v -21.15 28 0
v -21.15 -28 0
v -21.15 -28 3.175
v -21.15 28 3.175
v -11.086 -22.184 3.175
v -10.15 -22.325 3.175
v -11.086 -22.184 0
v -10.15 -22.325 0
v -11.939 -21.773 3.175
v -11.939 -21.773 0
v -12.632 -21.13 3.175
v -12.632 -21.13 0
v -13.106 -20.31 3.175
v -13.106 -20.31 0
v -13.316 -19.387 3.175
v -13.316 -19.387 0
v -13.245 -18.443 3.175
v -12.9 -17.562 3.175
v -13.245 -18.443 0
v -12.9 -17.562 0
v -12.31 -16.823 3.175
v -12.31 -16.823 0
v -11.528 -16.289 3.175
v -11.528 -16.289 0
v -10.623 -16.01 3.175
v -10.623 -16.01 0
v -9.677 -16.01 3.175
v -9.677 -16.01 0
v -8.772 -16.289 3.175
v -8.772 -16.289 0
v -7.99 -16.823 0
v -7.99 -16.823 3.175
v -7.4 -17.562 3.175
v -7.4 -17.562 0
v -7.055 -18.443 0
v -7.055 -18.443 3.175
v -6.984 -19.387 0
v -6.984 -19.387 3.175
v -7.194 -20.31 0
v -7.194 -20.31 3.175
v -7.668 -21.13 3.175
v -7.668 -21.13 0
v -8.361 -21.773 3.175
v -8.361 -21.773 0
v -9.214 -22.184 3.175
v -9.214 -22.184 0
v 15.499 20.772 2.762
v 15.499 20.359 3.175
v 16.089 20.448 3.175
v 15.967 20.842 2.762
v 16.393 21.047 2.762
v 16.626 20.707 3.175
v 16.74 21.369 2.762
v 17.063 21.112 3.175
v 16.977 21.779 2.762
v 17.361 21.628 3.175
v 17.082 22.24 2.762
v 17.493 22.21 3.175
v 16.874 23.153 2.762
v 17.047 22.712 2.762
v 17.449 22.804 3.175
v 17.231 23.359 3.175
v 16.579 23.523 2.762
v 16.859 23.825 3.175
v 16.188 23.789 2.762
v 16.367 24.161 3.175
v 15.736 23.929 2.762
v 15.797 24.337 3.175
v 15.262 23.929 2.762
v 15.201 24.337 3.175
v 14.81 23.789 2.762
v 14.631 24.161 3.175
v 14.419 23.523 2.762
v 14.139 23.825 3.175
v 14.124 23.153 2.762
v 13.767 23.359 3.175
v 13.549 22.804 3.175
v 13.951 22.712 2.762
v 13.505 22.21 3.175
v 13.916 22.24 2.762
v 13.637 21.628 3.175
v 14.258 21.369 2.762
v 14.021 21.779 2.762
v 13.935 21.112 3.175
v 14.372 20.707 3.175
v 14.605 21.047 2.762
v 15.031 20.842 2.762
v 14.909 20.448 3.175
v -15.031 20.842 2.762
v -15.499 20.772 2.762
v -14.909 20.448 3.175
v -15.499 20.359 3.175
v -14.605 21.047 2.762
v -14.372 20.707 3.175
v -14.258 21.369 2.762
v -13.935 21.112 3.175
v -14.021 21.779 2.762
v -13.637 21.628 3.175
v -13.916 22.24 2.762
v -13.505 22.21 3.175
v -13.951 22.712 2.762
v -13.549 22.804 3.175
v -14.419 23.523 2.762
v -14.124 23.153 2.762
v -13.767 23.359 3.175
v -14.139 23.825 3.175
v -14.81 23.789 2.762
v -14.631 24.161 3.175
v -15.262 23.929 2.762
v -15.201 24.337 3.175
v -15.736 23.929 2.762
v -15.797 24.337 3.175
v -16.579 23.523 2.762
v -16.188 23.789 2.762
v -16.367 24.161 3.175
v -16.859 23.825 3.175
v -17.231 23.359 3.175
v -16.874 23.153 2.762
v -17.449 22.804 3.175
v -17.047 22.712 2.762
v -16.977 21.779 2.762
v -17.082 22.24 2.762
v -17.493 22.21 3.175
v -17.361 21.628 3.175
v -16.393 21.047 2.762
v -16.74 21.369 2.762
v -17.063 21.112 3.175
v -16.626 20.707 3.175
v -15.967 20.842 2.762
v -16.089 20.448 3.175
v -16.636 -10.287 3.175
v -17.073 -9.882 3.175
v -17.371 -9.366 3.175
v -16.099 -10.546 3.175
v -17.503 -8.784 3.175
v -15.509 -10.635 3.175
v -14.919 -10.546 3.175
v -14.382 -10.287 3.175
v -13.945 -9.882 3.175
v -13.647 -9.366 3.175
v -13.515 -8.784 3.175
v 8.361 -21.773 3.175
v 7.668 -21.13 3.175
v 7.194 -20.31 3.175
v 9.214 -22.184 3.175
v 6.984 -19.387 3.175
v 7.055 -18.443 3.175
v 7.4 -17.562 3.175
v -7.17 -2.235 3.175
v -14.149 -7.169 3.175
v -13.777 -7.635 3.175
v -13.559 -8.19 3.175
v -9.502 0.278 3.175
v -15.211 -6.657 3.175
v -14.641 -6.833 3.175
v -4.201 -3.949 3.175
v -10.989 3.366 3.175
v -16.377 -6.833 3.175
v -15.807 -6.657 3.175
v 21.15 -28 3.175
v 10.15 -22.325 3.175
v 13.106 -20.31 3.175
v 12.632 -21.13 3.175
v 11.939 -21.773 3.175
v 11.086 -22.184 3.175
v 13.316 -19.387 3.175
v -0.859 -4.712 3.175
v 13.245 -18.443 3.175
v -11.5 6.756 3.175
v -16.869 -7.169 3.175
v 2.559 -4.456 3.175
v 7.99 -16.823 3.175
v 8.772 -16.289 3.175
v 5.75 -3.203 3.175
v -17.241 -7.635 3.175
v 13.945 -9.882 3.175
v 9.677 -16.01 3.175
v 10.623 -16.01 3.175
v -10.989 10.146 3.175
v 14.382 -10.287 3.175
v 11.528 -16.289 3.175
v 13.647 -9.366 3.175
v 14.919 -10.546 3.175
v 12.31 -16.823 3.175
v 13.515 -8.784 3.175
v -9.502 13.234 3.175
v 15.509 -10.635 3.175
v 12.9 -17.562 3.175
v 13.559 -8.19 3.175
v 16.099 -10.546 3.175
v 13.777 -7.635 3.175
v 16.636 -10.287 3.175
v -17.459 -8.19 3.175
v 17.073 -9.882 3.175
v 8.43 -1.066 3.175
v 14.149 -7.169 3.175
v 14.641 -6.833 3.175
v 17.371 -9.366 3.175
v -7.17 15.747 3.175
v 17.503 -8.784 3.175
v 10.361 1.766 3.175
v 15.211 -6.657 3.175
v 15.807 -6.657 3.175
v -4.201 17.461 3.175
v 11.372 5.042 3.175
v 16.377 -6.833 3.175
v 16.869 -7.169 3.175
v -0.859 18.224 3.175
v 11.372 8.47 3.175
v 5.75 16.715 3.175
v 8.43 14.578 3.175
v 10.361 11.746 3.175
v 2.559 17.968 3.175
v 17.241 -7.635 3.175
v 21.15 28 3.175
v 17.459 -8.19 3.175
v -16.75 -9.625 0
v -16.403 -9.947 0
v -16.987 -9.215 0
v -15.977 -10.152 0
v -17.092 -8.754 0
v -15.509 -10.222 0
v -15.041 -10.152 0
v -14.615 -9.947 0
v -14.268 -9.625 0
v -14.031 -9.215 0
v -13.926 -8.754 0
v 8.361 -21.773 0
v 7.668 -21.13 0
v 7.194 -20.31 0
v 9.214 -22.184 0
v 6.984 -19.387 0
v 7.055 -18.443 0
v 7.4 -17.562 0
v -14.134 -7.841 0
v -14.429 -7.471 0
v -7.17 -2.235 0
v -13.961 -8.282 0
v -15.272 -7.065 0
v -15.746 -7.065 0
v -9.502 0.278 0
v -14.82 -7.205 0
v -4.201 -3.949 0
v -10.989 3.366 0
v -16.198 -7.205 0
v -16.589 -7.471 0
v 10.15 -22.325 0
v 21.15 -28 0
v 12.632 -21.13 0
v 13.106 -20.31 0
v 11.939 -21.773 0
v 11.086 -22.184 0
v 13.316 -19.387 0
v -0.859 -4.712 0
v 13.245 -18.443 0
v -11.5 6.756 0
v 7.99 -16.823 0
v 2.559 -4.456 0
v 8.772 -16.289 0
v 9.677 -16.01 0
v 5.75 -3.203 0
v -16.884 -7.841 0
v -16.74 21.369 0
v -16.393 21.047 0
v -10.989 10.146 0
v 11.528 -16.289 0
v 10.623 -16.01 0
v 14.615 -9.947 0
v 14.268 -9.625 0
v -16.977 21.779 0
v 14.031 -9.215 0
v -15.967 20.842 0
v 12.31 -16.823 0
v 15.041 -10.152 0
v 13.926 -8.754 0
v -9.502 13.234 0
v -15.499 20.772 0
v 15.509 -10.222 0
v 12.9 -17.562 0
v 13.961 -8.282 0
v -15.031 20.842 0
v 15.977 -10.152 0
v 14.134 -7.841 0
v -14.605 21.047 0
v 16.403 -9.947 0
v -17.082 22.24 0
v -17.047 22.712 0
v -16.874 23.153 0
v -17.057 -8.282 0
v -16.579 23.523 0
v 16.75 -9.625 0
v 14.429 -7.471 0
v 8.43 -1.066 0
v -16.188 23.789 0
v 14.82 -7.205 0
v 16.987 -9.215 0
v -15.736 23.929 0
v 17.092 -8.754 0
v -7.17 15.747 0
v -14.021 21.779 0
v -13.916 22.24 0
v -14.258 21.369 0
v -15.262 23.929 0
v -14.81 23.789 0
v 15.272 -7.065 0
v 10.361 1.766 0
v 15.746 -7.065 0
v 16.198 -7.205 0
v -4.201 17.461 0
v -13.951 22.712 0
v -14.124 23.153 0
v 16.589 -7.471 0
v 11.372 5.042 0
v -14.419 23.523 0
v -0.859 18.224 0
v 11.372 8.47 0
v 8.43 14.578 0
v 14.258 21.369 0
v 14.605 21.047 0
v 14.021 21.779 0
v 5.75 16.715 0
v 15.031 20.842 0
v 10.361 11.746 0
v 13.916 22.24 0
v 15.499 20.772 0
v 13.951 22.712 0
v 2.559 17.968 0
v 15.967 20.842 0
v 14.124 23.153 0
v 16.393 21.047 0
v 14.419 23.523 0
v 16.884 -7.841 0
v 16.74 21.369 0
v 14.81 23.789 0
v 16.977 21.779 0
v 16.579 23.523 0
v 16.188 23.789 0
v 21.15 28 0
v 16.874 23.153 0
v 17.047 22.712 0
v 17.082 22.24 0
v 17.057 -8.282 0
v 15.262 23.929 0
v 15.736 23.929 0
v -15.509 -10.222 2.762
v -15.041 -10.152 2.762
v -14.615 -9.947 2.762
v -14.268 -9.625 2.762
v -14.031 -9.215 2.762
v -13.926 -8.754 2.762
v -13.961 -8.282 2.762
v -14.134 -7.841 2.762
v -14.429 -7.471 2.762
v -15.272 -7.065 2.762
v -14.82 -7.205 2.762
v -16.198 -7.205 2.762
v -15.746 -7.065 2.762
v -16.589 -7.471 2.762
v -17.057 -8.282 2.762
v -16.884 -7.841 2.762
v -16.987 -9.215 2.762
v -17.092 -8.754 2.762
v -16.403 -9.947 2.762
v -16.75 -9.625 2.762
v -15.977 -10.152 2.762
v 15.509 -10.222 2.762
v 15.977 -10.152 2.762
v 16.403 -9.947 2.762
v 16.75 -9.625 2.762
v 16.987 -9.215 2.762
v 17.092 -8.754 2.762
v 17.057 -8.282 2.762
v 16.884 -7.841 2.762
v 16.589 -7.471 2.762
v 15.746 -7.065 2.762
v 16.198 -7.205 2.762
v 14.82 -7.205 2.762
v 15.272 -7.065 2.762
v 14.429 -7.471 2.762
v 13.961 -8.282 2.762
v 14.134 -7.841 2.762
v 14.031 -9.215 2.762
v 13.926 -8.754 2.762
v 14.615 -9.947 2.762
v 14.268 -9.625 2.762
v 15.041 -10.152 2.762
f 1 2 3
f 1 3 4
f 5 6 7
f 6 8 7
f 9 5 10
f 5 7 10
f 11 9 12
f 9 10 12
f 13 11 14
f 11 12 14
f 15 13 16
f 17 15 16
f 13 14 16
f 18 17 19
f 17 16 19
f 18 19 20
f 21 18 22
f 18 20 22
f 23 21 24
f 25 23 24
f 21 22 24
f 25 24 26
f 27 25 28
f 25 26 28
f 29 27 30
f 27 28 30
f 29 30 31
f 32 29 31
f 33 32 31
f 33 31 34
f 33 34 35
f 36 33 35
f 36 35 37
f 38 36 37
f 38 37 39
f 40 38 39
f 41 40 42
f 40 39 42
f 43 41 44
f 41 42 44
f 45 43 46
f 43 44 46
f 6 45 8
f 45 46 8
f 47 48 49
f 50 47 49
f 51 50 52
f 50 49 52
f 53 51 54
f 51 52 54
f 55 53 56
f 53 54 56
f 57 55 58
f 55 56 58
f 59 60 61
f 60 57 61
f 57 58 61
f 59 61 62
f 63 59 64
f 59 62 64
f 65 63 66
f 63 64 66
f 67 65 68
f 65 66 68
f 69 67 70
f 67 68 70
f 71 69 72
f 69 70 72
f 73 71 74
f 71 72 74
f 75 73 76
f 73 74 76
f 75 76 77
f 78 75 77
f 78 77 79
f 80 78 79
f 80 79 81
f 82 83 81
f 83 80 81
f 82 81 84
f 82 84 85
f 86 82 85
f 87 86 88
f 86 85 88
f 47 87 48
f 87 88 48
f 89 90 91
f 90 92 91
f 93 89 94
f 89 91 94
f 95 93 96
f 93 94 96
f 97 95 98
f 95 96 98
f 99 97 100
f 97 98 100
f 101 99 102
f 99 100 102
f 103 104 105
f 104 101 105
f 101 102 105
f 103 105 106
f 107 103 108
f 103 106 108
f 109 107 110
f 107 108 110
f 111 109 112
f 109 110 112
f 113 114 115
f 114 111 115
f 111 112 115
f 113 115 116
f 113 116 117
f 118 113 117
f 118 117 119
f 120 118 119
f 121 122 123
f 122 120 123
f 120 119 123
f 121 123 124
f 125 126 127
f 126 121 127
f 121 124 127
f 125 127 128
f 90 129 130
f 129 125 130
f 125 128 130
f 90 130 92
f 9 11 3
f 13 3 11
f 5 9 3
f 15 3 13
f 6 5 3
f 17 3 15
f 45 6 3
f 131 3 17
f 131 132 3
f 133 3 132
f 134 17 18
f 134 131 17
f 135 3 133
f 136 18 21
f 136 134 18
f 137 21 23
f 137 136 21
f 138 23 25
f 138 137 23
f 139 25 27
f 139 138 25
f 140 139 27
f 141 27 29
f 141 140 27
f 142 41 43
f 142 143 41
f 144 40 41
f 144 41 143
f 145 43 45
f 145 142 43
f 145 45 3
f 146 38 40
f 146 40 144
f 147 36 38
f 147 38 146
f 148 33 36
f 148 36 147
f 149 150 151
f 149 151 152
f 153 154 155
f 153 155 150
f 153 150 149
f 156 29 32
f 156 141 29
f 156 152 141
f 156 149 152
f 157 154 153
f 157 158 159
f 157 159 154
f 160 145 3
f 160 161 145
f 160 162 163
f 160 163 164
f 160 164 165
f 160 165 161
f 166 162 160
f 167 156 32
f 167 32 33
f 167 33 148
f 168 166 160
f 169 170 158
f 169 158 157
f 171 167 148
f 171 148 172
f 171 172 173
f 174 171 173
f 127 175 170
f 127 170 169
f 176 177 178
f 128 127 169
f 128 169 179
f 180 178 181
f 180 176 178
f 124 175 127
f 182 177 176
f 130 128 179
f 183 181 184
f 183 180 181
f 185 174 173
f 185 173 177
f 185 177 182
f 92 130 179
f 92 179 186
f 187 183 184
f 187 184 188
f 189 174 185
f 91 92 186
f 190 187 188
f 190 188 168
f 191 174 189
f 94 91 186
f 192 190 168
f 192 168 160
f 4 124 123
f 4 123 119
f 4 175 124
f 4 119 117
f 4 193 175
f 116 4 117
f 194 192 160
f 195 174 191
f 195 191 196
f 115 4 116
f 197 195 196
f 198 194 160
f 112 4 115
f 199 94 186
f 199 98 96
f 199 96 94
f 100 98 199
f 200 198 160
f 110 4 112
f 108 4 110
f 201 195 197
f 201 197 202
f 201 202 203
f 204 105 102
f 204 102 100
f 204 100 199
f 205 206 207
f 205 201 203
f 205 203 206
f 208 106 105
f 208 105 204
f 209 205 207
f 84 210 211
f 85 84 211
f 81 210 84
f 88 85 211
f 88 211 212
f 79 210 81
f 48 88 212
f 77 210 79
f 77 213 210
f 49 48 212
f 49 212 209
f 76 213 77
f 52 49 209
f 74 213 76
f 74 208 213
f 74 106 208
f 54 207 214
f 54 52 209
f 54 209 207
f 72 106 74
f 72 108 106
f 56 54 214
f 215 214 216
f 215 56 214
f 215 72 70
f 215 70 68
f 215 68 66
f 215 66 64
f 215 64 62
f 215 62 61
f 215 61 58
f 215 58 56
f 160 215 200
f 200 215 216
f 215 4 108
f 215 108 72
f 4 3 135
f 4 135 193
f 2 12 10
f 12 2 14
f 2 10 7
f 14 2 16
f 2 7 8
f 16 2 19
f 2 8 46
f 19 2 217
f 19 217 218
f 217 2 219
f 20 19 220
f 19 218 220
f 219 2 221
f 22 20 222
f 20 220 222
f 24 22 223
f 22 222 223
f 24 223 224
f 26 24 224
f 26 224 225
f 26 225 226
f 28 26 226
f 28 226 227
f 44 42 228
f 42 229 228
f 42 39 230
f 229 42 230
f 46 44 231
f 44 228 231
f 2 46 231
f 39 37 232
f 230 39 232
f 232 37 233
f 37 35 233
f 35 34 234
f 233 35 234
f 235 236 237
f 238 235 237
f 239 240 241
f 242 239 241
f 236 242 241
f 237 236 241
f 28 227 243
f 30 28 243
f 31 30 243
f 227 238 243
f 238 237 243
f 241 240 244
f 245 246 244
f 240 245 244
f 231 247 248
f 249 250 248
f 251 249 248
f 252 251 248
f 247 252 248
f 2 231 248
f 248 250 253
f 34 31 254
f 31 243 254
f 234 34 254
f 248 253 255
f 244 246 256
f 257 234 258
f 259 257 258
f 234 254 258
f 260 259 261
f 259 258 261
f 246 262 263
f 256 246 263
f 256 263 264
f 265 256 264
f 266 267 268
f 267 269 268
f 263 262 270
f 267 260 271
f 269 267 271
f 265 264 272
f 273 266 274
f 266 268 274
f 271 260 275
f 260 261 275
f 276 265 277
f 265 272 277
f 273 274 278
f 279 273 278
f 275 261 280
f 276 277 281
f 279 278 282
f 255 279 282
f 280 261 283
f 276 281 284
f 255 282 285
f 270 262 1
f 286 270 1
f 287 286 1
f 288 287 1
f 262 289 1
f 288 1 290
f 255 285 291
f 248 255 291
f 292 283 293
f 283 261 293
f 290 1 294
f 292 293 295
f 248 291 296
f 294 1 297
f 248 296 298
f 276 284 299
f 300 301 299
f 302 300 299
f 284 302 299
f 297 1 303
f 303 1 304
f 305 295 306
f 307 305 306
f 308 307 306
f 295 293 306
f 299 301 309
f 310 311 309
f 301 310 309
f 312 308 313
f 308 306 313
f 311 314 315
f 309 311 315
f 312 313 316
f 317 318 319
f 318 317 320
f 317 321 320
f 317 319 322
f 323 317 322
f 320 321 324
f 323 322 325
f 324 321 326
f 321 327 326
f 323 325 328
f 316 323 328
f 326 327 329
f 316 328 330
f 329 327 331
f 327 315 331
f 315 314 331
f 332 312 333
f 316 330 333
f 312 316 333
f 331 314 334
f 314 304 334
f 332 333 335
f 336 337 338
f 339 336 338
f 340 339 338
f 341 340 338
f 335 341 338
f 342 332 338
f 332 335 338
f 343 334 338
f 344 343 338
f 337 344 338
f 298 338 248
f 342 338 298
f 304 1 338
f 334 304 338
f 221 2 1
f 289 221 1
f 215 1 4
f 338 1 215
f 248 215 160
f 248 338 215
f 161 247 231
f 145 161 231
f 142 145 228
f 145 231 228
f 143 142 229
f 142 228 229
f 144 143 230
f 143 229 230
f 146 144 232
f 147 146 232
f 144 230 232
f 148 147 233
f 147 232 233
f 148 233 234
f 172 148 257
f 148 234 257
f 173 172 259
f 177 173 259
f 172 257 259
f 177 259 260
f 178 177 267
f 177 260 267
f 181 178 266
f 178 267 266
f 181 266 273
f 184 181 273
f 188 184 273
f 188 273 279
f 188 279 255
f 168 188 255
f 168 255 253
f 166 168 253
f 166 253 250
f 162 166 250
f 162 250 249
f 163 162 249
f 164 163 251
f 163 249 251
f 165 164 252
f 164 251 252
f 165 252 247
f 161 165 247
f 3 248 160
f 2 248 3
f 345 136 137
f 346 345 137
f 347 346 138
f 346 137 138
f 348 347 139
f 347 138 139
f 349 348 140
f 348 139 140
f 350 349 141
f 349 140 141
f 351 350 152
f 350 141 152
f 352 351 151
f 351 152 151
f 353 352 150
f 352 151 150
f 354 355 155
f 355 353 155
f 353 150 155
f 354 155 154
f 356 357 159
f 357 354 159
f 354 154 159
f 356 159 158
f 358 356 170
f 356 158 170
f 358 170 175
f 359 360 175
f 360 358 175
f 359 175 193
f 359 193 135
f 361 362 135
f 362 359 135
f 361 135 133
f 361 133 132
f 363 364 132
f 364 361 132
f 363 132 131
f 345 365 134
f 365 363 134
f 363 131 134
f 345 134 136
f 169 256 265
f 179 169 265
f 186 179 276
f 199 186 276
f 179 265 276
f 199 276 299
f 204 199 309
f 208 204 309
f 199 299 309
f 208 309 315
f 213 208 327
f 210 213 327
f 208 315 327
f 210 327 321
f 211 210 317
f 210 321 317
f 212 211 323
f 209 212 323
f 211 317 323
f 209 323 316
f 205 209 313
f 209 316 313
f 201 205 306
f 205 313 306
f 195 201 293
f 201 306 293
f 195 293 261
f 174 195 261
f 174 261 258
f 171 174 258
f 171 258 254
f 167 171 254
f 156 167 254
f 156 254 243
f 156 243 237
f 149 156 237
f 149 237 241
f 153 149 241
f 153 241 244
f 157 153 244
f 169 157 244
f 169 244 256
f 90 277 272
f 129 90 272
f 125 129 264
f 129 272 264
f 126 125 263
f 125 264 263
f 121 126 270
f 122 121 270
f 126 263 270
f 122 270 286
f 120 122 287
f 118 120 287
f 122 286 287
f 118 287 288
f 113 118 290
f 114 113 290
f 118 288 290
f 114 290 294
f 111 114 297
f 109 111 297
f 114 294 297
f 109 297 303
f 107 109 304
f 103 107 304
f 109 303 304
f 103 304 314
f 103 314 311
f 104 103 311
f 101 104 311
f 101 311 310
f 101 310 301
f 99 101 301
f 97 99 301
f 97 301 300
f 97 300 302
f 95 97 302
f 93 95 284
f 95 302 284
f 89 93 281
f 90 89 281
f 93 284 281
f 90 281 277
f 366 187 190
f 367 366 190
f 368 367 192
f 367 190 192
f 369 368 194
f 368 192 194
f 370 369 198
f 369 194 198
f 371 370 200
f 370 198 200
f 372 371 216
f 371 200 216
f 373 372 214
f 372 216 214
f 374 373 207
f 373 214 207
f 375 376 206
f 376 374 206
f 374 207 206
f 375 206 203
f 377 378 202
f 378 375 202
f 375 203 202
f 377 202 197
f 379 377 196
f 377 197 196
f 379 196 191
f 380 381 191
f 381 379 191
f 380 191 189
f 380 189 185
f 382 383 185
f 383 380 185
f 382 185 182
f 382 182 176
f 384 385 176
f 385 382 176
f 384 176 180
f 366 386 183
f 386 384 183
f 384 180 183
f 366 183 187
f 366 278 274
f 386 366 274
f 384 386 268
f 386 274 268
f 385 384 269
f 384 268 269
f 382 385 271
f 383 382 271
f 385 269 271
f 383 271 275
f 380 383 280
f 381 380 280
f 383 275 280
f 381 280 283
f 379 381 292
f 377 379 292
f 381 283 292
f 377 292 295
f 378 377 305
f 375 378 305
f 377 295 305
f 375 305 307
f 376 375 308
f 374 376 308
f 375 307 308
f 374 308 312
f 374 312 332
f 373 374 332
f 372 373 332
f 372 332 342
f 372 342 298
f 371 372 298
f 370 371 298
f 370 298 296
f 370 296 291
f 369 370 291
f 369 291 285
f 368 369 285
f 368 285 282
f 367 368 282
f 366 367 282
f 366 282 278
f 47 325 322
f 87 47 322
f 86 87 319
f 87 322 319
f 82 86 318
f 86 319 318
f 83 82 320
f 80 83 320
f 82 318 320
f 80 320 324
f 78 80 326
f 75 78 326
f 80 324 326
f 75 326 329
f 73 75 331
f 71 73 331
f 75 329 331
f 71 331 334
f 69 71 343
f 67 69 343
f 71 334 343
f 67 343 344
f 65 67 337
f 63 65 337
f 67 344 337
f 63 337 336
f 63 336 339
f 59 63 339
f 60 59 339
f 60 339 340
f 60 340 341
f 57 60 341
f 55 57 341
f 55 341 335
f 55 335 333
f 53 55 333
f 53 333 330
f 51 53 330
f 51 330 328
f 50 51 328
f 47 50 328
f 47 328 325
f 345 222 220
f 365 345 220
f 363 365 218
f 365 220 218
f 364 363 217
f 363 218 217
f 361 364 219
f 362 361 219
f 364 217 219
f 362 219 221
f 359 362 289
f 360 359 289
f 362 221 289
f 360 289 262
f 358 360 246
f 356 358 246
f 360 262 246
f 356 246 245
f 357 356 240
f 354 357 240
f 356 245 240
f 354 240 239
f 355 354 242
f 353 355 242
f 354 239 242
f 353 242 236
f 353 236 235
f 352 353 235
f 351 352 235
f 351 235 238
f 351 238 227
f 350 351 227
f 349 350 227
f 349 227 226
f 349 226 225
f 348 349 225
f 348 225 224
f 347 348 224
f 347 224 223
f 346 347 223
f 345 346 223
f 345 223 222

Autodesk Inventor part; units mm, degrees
ref_plane "YZ Plane" through (0, 0, 0) normal (1, 0, 0) x (0, 1, 0)
ref_plane "XZ Plane" through (0, 0, 0) normal (0, 1, 0) x (-1, 0, 0)
ref_plane "XY Plane" through (0, 0, 0) normal (0, 0, 1) x (1, 0, 0)
sketch "Sketch1" plane through (0, 0, 0) normal (0, 0, 1) x (1, 0, 0)
  line L0 (-21.15, 28) -> (21.15, 28)
  line L1 (21.15, 28) -> (21.15, -28)
  line L2 (21.15, -28) -> (-21.15, -28)
  line L3 (-21.15, -28) -> (-21.15, 28)
  point P0 (0, 0)
  dimension "d0" = 56
  dimension "d1" = 42.3
  dimension "d2" = 21.15
  dimension "d3" = 28
  dimension "d44" = 21.15
extrude "Extrusion1" add sketch "Sketch1" along normal blind 3.175
sketch "Sketch2" plane through (0, 0, 3.175) normal (0, 0, 1) x (1, 0, 0)
  circle A0 centre (-15.499, 22.359) radius 1.5875
  circle A1 centre (15.499, 22.359) radius 1.5875
  line L0 (21.15, 28) -> (-21.15, 28) projected
  line L1 (-21.15, 28) -> (-21.15, -28) projected
  line L2 (21.15, -28) -> (21.15, 28) projected
  circle A2 centre (-15.509, -8.635) radius 1.5875
  circle A3 centre (15.509, -8.635) radius 1.5875
  point P0 (0, 0)
  dimension "d6" = 3.175
  dimension "d7" = 5.641
  dimension "d8" = 5.641
  dimension "d9" = 5.651
  dimension "d10" = 5.651
  dimension "d11" = 3.175
  dimension "d45" = 3.175
  dimension "d46" = 3.175
  dimension "d47" = 5.641
  dimension "d48" = 5.641
  dimension "d49" = 36.635
  dimension "d50" = 36.635
hole "Hole1" at (-15.499, 22.359, 3.175) at (15.499, 22.359, 3.175) at (-15.509, -8.635, 3.175) at (15.509, -8.635, 3.175) direction (0, 0, -1) diameter 3.175 end through all countersink diameter 4 countersink angle 90
sketch "Sketch3" plane through (0, 0, 3.175) normal (0, 0, 1) x (1, 0, 0)
  circle A0 centre (-10.15, -19.15) radius 3.175
  circle A1 centre (10.15, -19.15) radius 3.175
  line L0 (-21.15, -28) -> (21.15, -28) projected
  line L1 (21.15, -28) -> (21.15, 28) projected
  line L2 (-21.15, 28) -> (-21.15, -28) projected
  line L3 (21.15, 28) -> (-21.15, 28) projected
  point P0 (0, 0)
  dimension "d19" = 6.35
  dimension "d20" = 6.35
  dimension "d22" = 11
  dimension "d23" = 11
  dimension "d25" = 47.15
  dimension "d26" = 47.15
hole "Hole2" at (-10.15, -19.15, 3.175) at (10.15, -19.15, 3.175) direction (0, 0, -1) diameter 6.35 end through all
sketch "Sketch5" plane through (0, 0, 0) normal (0, 0, -1) x (-1, 0, 0)
  circle A0 centre (0, 6.756) radius 11.5
  line L0 (21.15, 28) -> (-21.15, 28) projected
  line L1 (21.15, -28) -> (21.15, 28) projected
  point P0 (0, 0)
  dimension "d39" = 23
  dimension "d40" = 21.244
  dimension "d41" = 21.15
extrude "Extrusion3" cut sketch "Sketch5" against normal through all
properties part number "MOTOR MOUNT"
